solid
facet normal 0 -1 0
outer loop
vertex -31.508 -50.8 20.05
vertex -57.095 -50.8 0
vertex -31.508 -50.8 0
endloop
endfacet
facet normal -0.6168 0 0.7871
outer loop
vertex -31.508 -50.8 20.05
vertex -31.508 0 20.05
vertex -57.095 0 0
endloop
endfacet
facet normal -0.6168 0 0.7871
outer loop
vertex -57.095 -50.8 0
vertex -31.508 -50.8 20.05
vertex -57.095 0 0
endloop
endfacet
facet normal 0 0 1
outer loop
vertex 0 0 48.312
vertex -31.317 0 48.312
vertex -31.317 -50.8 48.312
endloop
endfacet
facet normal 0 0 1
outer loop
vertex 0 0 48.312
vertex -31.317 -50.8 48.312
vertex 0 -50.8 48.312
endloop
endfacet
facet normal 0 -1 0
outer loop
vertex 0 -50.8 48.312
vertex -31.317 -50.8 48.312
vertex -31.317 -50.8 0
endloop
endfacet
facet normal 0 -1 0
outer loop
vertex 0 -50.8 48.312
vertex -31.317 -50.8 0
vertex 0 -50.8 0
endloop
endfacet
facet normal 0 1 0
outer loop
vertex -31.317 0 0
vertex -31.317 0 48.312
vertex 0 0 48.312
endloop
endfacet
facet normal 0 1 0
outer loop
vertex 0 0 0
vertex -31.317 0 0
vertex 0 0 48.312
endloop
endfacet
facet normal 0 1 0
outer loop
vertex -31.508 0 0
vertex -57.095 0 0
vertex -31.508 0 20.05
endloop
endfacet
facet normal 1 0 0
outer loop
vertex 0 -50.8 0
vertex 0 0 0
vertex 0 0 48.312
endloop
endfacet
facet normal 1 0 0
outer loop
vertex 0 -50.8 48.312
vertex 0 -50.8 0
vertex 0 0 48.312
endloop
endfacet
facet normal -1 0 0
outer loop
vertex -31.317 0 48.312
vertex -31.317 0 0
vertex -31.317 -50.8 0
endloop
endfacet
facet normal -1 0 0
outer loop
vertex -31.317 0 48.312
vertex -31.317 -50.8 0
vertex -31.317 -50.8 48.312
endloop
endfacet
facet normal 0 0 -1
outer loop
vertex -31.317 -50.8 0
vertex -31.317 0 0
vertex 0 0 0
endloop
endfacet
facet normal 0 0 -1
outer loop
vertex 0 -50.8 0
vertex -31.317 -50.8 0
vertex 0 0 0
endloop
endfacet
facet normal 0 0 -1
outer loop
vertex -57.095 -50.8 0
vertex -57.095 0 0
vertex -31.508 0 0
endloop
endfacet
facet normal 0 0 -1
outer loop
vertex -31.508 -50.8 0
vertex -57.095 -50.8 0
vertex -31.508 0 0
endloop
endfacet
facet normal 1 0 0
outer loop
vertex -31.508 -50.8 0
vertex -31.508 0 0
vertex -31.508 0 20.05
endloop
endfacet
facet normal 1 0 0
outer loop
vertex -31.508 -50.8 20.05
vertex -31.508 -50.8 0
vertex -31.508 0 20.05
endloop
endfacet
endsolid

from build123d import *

# Parameters (mm, degrees)
F0_W     = 31.316563
F0_H     = 48.311528
F1_DEPTH = 50.8
F3_DEPTH = 50.8


with BuildPart() as f1:
    # F0 (on Front) → F1 (new body)
    with BuildSketch(Plane.XZ):
        with Locations((-15.658281, 24.155764)):
            Rectangle(F0_W, F0_H)
    extrude(amount=F1_DEPTH)


with BuildPart() as f3:
    # F2 (on Front) → F3 (new body)
    with BuildSketch(Plane.XZ):
        Polygon((-31.507518, 20.050241), (-57.095442, 0), (-31.507518, 0), align=None)
    extrude(amount=F3_DEPTH)


solid = Compound([f1.part, f3.part])
